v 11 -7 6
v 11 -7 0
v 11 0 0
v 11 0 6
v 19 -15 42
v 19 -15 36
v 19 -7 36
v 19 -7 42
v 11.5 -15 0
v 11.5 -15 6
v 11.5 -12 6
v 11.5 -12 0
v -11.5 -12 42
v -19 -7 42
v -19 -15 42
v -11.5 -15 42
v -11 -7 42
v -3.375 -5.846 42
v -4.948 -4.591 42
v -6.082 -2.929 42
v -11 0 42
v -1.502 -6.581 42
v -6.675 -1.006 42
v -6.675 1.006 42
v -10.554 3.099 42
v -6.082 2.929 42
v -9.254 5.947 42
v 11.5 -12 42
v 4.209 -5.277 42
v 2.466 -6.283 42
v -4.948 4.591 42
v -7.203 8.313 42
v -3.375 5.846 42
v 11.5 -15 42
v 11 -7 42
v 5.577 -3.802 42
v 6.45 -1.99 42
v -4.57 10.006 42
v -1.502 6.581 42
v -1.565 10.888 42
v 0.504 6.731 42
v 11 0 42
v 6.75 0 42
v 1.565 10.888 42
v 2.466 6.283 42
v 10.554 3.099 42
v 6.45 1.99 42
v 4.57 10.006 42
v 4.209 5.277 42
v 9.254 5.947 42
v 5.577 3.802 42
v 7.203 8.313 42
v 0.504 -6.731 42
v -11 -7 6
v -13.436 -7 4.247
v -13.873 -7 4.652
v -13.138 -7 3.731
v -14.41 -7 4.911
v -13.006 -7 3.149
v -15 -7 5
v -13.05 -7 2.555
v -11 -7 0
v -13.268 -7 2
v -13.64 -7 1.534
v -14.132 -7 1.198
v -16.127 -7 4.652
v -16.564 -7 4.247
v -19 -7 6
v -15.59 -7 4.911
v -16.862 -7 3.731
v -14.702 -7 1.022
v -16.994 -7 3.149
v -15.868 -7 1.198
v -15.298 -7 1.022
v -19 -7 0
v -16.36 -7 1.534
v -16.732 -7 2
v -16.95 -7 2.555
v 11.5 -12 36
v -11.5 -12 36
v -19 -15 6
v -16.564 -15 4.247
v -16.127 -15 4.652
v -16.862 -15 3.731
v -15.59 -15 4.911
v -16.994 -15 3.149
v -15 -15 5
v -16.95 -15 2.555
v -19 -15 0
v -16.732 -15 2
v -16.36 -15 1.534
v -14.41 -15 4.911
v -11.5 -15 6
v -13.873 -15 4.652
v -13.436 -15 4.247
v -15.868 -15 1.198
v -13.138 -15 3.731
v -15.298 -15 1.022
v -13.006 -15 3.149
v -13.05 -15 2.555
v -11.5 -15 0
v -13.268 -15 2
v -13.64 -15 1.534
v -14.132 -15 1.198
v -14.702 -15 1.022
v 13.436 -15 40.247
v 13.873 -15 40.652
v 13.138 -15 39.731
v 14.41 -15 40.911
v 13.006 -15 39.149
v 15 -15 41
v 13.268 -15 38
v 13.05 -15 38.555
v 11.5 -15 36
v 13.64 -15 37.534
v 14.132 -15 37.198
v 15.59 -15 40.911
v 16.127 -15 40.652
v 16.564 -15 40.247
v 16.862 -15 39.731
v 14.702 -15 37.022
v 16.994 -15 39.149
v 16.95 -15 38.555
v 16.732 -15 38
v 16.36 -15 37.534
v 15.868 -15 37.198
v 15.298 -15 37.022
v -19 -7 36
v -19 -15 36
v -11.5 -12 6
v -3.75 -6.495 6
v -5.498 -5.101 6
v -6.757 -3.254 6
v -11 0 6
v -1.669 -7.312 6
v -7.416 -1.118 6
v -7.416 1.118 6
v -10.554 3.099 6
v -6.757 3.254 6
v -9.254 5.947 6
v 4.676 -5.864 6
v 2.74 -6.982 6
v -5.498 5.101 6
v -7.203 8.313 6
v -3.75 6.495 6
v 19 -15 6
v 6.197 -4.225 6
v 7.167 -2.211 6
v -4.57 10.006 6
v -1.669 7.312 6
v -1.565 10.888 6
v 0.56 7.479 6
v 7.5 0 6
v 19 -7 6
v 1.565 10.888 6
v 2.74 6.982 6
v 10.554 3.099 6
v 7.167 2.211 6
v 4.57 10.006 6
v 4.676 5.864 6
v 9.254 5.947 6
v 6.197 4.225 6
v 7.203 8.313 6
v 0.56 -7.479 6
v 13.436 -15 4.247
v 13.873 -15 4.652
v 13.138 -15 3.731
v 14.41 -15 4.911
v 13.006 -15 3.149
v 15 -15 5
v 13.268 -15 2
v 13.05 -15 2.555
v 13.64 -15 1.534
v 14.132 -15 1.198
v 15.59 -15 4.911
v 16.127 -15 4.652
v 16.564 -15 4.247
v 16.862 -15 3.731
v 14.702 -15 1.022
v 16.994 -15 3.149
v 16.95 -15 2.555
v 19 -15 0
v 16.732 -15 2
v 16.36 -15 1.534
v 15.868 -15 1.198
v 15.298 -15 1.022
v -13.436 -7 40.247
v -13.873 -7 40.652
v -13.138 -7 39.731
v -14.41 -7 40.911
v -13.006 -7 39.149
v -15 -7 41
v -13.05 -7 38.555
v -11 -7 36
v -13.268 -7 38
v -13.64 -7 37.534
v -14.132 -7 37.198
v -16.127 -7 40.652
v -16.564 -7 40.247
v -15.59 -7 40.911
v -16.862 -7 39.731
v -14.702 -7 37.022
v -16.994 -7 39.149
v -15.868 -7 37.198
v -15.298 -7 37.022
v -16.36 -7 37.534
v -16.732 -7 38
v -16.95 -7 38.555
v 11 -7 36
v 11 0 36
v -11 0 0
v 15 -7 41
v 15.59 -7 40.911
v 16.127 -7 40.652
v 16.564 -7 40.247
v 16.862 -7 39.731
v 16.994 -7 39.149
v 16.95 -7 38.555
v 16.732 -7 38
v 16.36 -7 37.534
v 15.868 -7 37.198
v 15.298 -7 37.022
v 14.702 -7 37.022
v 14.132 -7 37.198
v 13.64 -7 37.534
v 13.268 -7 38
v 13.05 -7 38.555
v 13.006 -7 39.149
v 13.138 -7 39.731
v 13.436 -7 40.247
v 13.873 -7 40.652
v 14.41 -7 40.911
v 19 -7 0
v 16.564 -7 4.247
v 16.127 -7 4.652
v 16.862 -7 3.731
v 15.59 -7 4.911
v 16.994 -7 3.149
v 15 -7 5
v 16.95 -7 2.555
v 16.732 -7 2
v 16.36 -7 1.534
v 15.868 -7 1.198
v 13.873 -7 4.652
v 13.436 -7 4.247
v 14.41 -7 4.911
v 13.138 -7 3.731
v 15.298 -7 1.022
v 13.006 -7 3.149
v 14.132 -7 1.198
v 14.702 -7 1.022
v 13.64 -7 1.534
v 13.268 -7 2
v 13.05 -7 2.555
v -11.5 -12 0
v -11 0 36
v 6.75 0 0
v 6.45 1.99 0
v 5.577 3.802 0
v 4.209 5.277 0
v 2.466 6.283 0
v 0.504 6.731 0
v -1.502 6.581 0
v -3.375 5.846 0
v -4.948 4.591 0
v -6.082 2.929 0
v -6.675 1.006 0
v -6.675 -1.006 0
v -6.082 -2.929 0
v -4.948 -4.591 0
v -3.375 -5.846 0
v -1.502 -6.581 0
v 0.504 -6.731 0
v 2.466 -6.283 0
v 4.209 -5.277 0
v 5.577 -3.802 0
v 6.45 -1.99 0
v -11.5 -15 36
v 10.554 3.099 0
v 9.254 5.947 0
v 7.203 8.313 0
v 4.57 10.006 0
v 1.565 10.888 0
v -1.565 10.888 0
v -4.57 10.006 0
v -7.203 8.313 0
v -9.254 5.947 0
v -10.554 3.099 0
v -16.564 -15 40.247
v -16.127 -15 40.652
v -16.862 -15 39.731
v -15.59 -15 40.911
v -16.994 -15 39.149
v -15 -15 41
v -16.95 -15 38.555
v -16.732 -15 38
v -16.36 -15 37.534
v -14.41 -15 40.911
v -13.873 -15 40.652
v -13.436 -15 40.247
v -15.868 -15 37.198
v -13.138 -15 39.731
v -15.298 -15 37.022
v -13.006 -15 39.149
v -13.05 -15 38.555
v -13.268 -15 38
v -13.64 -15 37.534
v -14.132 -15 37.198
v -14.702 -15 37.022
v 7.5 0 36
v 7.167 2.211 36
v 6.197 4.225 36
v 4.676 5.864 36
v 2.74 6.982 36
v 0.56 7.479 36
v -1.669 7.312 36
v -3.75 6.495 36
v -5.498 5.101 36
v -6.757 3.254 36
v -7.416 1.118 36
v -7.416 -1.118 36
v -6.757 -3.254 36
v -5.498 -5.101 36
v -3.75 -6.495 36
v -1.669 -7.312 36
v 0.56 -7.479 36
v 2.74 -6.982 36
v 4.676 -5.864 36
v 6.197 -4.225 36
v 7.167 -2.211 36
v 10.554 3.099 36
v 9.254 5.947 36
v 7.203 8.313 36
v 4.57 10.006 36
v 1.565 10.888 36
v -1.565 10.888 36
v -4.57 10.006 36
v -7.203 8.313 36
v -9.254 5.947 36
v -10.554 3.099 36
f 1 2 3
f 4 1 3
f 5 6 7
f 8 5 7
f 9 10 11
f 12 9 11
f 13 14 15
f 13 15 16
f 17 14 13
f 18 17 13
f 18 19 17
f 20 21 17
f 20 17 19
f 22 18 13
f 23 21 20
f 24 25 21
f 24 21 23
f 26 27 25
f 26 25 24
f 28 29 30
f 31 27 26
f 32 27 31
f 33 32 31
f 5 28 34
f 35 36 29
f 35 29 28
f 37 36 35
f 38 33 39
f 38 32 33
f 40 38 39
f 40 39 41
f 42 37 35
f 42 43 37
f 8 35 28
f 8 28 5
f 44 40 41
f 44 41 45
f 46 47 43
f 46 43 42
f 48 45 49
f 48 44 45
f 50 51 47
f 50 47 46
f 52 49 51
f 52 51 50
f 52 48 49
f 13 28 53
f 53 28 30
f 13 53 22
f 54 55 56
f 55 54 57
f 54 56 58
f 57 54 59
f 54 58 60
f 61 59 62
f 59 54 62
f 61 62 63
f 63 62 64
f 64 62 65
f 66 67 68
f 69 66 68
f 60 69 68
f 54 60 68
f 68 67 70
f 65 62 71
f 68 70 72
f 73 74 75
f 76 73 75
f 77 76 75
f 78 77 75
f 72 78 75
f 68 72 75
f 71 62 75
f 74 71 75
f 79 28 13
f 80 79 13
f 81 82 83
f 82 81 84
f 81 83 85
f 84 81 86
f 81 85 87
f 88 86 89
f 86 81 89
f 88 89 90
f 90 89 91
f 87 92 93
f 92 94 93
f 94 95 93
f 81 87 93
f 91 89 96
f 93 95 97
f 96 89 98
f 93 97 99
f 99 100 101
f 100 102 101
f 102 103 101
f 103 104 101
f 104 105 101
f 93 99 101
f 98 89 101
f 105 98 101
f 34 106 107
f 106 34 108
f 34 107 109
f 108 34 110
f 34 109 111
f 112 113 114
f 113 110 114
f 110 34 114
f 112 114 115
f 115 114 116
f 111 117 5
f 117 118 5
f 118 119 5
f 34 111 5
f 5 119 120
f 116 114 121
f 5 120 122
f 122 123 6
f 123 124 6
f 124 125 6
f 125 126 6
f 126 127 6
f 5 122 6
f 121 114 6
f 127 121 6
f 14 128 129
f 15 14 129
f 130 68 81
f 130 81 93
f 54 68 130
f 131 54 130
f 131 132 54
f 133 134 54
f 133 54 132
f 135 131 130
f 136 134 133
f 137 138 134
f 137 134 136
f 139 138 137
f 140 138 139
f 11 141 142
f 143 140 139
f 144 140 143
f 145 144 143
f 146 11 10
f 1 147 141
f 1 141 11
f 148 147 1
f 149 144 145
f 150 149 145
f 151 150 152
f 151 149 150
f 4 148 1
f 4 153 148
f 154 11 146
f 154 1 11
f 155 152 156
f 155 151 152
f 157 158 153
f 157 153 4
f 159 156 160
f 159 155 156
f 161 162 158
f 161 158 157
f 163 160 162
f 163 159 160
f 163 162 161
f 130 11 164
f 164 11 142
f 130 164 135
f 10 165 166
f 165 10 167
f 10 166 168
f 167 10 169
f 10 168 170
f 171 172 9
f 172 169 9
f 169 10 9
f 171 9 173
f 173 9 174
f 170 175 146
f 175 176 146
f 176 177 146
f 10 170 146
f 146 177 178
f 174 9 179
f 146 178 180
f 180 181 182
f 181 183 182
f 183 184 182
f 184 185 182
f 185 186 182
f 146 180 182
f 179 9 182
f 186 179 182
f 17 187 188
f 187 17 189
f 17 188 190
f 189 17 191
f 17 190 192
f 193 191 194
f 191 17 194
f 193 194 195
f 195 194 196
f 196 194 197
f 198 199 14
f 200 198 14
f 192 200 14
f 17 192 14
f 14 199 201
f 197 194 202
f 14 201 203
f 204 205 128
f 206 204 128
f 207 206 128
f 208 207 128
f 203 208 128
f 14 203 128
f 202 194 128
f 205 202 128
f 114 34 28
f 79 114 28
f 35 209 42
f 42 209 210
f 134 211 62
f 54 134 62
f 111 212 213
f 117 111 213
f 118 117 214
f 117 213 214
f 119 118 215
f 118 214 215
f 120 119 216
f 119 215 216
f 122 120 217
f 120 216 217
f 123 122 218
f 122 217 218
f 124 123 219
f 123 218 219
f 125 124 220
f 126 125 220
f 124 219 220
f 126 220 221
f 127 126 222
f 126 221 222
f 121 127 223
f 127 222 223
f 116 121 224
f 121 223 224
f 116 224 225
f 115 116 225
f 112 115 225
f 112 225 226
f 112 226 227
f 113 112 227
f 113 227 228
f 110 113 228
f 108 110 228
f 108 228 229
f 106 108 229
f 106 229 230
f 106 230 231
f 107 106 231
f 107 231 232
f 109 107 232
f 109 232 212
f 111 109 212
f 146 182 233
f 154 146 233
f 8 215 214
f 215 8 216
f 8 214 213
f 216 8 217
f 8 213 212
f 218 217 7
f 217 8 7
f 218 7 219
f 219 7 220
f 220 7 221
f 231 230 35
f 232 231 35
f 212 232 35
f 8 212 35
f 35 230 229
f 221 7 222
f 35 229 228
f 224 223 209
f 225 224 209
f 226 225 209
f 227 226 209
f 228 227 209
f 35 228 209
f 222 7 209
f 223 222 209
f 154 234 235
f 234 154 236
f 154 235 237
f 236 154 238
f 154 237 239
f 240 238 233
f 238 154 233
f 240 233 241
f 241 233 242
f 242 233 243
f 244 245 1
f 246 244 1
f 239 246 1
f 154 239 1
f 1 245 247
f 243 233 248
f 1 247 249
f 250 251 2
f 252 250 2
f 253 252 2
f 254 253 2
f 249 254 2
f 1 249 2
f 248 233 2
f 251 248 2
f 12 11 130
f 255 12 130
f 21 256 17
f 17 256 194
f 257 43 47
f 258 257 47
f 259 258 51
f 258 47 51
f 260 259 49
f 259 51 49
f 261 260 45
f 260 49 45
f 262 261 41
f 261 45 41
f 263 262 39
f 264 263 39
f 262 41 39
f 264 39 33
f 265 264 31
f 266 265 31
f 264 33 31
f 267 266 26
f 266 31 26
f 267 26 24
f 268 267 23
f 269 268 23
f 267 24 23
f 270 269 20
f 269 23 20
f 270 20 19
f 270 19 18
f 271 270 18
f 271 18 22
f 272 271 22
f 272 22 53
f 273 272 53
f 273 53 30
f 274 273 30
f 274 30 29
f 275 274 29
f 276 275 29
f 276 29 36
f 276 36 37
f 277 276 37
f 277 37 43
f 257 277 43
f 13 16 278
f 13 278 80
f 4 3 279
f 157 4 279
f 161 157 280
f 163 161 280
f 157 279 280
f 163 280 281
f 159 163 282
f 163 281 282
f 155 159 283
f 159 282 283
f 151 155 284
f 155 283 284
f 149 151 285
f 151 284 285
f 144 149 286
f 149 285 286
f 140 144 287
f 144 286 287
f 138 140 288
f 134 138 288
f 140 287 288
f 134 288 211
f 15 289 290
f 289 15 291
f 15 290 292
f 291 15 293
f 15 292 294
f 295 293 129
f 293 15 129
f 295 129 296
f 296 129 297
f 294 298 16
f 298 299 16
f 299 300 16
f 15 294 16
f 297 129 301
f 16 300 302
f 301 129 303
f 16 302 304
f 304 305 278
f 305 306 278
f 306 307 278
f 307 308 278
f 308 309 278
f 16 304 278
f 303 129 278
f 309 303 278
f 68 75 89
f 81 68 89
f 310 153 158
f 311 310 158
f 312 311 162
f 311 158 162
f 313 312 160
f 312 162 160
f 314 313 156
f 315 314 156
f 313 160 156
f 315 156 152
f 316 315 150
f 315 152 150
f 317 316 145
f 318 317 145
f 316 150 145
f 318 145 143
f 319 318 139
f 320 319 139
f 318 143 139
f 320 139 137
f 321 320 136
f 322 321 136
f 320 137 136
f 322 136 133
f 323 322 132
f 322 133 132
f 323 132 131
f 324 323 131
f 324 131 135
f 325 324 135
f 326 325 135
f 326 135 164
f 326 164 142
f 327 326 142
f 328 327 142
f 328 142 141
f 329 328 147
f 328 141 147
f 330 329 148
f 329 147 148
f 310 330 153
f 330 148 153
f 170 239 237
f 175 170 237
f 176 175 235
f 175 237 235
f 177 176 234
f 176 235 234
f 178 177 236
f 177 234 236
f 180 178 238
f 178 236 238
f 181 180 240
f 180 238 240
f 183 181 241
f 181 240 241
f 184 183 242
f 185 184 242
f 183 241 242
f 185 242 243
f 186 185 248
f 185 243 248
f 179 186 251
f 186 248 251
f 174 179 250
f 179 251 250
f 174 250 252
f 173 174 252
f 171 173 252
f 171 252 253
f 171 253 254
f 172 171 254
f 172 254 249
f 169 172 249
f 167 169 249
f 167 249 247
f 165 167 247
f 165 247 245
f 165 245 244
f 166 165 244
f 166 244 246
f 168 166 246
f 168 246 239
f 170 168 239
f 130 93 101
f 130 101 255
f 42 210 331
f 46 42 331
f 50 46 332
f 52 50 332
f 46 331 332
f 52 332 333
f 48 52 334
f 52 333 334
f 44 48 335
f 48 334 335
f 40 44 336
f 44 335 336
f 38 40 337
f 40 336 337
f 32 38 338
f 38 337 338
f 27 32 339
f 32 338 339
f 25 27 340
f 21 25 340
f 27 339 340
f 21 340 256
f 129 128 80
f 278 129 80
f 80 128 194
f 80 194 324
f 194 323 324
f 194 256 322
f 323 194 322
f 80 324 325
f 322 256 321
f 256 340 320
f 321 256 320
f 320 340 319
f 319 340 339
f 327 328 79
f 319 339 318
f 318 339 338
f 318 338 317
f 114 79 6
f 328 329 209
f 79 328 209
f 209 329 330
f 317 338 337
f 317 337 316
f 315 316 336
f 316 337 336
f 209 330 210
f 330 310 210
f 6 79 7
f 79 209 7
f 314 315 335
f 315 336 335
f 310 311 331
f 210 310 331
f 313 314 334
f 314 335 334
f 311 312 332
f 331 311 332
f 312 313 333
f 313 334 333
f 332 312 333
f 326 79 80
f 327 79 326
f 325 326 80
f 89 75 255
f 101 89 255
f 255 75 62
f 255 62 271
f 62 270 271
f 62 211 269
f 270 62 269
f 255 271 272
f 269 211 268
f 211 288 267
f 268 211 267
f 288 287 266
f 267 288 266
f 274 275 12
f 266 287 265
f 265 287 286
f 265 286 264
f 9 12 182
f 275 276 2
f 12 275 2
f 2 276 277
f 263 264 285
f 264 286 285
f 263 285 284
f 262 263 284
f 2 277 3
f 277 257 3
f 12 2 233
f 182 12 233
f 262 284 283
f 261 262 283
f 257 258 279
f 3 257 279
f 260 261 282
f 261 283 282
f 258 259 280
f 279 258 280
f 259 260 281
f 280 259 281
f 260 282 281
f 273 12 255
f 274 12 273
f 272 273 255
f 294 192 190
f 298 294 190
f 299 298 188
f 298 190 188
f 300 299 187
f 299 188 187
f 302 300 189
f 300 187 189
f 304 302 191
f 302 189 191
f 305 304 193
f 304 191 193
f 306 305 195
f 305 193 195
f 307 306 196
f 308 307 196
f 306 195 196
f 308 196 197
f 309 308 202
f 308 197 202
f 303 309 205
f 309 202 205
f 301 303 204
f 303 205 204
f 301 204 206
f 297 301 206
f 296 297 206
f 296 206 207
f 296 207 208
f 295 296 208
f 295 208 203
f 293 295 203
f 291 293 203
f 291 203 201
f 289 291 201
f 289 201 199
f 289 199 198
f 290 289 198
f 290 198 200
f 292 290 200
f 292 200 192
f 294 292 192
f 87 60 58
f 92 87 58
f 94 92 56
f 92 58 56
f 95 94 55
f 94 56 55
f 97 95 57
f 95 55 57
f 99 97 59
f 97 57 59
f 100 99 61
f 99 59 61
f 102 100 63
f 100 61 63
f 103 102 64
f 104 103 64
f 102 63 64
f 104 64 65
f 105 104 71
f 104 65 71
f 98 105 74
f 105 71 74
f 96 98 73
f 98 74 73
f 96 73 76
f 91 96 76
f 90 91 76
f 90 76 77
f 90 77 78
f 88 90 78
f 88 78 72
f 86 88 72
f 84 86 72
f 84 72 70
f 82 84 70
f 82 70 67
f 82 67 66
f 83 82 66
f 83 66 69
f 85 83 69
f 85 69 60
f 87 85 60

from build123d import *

# Parameters (mm, degrees)
BOSS_EXTRUDE1_DEPTH     = 6
SKETCH2_R               = 7.5
BOSS_EXTRUDE2_DEPTH     = 30
BOSS_EXTRUDE3_DEPTH     = 6
SKETCH4_R               = 6.75
CUT_EXTRUDE1_DEPTH      = 49.476798574
CUT_EXTRUDE2_DEPTH      = 49.476798574
CUT_EXTRUDE2_DEPTH_BACK = 49.476798574
SKETCH5_W               = 23
SKETCH5_H               = 3
SKETCH6_R               = 2
CUT_EXTRUDE3_DEPTH      = 50.487372127


with BuildPart() as part:
    # Sketch1 → Boss-Extrude1 (new body)
    with BuildSketch(Plane.XY):
        with BuildLine():
            Line((-11, 0), (-11, -7))
            Line((-11, -7), (-19, -7))
            Line((-19, -7), (-19, -15))
            Line((-19, -15), (-11, -15))
            Line((-11, -15), (11, -15))
            Line((11, -15), (19, -15))
            Line((19, -15), (19, -7))
            Line((19, -7), (11, -7))
            Line((11, -7), (11, 0))
            ThreePointArc((11, 0), (0, 11), (-11, 0))
        make_face()
    extrude(amount=BOSS_EXTRUDE1_DEPTH)

    # Sketch2 → Boss-Extrude2 (add)
    with BuildSketch(Plane.XY.offset(6)):
        Circle(SKETCH2_R)
    extrude(amount=BOSS_EXTRUDE2_DEPTH)

    # Sketch3 → Boss-Extrude3 (add)
    with BuildSketch(Plane.XY.offset(36)):
        with BuildLine():
            Line((-11, 0), (-11, -7))
            Line((-11, -7), (-19, -7))
            Line((-19, -7), (-19, -15))
            Line((-19, -15), (19, -15))
            Line((19, -15), (19, -7))
            Line((19, -7), (11, -7))
            Line((11, -7), (11, 0))
            ThreePointArc((11, 0), (0, 11), (-11, 0))
        make_face()
    extrude(amount=BOSS_EXTRUDE3_DEPTH)

    # Sketch4 → Cut-Extrude1 (cut, through all)
    with BuildSketch(Plane.XY.offset(42)):
        Circle(SKETCH4_R)
    extrude(amount=-CUT_EXTRUDE1_DEPTH, mode=Mode.SUBTRACT)

    # Sketch5 → Cut-Extrude2 (cut, two sides: drawn at the far end of the back side and taken through both)
    with BuildSketch(Plane(origin=(0, 0, 0), x_dir=(-1, 0, 0), z_dir=(0, 0, -1)).offset(-CUT_EXTRUDE2_DEPTH_BACK)):
        with Locations((0, -13.5)):
            Rectangle(SKETCH5_W, SKETCH5_H)
    extrude(amount=CUT_EXTRUDE2_DEPTH + CUT_EXTRUDE2_DEPTH_BACK, mode=Mode.SUBTRACT)

    # Sketch6 → Cut-Extrude3 (cut, through all)
    with BuildSketch(Plane(origin=(0, -7, 0), x_dir=(1, 0, 0), z_dir=(0, 1, 0))):
        with Locations(Location((-15, -3, 0), (0, 0, 270))):
            Circle(SKETCH6_R)
        with Locations(Location((15, -3, 0), (0, 0, 270))):
            Circle(SKETCH6_R)
        with Locations(Location((15, -39, 0), (0, 0, 270))):
            Circle(SKETCH6_R)
        with Locations(Location((-15, -39, 0), (0, 0, 270))):
            Circle(SKETCH6_R)
    extrude(amount=-CUT_EXTRUDE3_DEPTH, mode=Mode.SUBTRACT)


solid = part.part
